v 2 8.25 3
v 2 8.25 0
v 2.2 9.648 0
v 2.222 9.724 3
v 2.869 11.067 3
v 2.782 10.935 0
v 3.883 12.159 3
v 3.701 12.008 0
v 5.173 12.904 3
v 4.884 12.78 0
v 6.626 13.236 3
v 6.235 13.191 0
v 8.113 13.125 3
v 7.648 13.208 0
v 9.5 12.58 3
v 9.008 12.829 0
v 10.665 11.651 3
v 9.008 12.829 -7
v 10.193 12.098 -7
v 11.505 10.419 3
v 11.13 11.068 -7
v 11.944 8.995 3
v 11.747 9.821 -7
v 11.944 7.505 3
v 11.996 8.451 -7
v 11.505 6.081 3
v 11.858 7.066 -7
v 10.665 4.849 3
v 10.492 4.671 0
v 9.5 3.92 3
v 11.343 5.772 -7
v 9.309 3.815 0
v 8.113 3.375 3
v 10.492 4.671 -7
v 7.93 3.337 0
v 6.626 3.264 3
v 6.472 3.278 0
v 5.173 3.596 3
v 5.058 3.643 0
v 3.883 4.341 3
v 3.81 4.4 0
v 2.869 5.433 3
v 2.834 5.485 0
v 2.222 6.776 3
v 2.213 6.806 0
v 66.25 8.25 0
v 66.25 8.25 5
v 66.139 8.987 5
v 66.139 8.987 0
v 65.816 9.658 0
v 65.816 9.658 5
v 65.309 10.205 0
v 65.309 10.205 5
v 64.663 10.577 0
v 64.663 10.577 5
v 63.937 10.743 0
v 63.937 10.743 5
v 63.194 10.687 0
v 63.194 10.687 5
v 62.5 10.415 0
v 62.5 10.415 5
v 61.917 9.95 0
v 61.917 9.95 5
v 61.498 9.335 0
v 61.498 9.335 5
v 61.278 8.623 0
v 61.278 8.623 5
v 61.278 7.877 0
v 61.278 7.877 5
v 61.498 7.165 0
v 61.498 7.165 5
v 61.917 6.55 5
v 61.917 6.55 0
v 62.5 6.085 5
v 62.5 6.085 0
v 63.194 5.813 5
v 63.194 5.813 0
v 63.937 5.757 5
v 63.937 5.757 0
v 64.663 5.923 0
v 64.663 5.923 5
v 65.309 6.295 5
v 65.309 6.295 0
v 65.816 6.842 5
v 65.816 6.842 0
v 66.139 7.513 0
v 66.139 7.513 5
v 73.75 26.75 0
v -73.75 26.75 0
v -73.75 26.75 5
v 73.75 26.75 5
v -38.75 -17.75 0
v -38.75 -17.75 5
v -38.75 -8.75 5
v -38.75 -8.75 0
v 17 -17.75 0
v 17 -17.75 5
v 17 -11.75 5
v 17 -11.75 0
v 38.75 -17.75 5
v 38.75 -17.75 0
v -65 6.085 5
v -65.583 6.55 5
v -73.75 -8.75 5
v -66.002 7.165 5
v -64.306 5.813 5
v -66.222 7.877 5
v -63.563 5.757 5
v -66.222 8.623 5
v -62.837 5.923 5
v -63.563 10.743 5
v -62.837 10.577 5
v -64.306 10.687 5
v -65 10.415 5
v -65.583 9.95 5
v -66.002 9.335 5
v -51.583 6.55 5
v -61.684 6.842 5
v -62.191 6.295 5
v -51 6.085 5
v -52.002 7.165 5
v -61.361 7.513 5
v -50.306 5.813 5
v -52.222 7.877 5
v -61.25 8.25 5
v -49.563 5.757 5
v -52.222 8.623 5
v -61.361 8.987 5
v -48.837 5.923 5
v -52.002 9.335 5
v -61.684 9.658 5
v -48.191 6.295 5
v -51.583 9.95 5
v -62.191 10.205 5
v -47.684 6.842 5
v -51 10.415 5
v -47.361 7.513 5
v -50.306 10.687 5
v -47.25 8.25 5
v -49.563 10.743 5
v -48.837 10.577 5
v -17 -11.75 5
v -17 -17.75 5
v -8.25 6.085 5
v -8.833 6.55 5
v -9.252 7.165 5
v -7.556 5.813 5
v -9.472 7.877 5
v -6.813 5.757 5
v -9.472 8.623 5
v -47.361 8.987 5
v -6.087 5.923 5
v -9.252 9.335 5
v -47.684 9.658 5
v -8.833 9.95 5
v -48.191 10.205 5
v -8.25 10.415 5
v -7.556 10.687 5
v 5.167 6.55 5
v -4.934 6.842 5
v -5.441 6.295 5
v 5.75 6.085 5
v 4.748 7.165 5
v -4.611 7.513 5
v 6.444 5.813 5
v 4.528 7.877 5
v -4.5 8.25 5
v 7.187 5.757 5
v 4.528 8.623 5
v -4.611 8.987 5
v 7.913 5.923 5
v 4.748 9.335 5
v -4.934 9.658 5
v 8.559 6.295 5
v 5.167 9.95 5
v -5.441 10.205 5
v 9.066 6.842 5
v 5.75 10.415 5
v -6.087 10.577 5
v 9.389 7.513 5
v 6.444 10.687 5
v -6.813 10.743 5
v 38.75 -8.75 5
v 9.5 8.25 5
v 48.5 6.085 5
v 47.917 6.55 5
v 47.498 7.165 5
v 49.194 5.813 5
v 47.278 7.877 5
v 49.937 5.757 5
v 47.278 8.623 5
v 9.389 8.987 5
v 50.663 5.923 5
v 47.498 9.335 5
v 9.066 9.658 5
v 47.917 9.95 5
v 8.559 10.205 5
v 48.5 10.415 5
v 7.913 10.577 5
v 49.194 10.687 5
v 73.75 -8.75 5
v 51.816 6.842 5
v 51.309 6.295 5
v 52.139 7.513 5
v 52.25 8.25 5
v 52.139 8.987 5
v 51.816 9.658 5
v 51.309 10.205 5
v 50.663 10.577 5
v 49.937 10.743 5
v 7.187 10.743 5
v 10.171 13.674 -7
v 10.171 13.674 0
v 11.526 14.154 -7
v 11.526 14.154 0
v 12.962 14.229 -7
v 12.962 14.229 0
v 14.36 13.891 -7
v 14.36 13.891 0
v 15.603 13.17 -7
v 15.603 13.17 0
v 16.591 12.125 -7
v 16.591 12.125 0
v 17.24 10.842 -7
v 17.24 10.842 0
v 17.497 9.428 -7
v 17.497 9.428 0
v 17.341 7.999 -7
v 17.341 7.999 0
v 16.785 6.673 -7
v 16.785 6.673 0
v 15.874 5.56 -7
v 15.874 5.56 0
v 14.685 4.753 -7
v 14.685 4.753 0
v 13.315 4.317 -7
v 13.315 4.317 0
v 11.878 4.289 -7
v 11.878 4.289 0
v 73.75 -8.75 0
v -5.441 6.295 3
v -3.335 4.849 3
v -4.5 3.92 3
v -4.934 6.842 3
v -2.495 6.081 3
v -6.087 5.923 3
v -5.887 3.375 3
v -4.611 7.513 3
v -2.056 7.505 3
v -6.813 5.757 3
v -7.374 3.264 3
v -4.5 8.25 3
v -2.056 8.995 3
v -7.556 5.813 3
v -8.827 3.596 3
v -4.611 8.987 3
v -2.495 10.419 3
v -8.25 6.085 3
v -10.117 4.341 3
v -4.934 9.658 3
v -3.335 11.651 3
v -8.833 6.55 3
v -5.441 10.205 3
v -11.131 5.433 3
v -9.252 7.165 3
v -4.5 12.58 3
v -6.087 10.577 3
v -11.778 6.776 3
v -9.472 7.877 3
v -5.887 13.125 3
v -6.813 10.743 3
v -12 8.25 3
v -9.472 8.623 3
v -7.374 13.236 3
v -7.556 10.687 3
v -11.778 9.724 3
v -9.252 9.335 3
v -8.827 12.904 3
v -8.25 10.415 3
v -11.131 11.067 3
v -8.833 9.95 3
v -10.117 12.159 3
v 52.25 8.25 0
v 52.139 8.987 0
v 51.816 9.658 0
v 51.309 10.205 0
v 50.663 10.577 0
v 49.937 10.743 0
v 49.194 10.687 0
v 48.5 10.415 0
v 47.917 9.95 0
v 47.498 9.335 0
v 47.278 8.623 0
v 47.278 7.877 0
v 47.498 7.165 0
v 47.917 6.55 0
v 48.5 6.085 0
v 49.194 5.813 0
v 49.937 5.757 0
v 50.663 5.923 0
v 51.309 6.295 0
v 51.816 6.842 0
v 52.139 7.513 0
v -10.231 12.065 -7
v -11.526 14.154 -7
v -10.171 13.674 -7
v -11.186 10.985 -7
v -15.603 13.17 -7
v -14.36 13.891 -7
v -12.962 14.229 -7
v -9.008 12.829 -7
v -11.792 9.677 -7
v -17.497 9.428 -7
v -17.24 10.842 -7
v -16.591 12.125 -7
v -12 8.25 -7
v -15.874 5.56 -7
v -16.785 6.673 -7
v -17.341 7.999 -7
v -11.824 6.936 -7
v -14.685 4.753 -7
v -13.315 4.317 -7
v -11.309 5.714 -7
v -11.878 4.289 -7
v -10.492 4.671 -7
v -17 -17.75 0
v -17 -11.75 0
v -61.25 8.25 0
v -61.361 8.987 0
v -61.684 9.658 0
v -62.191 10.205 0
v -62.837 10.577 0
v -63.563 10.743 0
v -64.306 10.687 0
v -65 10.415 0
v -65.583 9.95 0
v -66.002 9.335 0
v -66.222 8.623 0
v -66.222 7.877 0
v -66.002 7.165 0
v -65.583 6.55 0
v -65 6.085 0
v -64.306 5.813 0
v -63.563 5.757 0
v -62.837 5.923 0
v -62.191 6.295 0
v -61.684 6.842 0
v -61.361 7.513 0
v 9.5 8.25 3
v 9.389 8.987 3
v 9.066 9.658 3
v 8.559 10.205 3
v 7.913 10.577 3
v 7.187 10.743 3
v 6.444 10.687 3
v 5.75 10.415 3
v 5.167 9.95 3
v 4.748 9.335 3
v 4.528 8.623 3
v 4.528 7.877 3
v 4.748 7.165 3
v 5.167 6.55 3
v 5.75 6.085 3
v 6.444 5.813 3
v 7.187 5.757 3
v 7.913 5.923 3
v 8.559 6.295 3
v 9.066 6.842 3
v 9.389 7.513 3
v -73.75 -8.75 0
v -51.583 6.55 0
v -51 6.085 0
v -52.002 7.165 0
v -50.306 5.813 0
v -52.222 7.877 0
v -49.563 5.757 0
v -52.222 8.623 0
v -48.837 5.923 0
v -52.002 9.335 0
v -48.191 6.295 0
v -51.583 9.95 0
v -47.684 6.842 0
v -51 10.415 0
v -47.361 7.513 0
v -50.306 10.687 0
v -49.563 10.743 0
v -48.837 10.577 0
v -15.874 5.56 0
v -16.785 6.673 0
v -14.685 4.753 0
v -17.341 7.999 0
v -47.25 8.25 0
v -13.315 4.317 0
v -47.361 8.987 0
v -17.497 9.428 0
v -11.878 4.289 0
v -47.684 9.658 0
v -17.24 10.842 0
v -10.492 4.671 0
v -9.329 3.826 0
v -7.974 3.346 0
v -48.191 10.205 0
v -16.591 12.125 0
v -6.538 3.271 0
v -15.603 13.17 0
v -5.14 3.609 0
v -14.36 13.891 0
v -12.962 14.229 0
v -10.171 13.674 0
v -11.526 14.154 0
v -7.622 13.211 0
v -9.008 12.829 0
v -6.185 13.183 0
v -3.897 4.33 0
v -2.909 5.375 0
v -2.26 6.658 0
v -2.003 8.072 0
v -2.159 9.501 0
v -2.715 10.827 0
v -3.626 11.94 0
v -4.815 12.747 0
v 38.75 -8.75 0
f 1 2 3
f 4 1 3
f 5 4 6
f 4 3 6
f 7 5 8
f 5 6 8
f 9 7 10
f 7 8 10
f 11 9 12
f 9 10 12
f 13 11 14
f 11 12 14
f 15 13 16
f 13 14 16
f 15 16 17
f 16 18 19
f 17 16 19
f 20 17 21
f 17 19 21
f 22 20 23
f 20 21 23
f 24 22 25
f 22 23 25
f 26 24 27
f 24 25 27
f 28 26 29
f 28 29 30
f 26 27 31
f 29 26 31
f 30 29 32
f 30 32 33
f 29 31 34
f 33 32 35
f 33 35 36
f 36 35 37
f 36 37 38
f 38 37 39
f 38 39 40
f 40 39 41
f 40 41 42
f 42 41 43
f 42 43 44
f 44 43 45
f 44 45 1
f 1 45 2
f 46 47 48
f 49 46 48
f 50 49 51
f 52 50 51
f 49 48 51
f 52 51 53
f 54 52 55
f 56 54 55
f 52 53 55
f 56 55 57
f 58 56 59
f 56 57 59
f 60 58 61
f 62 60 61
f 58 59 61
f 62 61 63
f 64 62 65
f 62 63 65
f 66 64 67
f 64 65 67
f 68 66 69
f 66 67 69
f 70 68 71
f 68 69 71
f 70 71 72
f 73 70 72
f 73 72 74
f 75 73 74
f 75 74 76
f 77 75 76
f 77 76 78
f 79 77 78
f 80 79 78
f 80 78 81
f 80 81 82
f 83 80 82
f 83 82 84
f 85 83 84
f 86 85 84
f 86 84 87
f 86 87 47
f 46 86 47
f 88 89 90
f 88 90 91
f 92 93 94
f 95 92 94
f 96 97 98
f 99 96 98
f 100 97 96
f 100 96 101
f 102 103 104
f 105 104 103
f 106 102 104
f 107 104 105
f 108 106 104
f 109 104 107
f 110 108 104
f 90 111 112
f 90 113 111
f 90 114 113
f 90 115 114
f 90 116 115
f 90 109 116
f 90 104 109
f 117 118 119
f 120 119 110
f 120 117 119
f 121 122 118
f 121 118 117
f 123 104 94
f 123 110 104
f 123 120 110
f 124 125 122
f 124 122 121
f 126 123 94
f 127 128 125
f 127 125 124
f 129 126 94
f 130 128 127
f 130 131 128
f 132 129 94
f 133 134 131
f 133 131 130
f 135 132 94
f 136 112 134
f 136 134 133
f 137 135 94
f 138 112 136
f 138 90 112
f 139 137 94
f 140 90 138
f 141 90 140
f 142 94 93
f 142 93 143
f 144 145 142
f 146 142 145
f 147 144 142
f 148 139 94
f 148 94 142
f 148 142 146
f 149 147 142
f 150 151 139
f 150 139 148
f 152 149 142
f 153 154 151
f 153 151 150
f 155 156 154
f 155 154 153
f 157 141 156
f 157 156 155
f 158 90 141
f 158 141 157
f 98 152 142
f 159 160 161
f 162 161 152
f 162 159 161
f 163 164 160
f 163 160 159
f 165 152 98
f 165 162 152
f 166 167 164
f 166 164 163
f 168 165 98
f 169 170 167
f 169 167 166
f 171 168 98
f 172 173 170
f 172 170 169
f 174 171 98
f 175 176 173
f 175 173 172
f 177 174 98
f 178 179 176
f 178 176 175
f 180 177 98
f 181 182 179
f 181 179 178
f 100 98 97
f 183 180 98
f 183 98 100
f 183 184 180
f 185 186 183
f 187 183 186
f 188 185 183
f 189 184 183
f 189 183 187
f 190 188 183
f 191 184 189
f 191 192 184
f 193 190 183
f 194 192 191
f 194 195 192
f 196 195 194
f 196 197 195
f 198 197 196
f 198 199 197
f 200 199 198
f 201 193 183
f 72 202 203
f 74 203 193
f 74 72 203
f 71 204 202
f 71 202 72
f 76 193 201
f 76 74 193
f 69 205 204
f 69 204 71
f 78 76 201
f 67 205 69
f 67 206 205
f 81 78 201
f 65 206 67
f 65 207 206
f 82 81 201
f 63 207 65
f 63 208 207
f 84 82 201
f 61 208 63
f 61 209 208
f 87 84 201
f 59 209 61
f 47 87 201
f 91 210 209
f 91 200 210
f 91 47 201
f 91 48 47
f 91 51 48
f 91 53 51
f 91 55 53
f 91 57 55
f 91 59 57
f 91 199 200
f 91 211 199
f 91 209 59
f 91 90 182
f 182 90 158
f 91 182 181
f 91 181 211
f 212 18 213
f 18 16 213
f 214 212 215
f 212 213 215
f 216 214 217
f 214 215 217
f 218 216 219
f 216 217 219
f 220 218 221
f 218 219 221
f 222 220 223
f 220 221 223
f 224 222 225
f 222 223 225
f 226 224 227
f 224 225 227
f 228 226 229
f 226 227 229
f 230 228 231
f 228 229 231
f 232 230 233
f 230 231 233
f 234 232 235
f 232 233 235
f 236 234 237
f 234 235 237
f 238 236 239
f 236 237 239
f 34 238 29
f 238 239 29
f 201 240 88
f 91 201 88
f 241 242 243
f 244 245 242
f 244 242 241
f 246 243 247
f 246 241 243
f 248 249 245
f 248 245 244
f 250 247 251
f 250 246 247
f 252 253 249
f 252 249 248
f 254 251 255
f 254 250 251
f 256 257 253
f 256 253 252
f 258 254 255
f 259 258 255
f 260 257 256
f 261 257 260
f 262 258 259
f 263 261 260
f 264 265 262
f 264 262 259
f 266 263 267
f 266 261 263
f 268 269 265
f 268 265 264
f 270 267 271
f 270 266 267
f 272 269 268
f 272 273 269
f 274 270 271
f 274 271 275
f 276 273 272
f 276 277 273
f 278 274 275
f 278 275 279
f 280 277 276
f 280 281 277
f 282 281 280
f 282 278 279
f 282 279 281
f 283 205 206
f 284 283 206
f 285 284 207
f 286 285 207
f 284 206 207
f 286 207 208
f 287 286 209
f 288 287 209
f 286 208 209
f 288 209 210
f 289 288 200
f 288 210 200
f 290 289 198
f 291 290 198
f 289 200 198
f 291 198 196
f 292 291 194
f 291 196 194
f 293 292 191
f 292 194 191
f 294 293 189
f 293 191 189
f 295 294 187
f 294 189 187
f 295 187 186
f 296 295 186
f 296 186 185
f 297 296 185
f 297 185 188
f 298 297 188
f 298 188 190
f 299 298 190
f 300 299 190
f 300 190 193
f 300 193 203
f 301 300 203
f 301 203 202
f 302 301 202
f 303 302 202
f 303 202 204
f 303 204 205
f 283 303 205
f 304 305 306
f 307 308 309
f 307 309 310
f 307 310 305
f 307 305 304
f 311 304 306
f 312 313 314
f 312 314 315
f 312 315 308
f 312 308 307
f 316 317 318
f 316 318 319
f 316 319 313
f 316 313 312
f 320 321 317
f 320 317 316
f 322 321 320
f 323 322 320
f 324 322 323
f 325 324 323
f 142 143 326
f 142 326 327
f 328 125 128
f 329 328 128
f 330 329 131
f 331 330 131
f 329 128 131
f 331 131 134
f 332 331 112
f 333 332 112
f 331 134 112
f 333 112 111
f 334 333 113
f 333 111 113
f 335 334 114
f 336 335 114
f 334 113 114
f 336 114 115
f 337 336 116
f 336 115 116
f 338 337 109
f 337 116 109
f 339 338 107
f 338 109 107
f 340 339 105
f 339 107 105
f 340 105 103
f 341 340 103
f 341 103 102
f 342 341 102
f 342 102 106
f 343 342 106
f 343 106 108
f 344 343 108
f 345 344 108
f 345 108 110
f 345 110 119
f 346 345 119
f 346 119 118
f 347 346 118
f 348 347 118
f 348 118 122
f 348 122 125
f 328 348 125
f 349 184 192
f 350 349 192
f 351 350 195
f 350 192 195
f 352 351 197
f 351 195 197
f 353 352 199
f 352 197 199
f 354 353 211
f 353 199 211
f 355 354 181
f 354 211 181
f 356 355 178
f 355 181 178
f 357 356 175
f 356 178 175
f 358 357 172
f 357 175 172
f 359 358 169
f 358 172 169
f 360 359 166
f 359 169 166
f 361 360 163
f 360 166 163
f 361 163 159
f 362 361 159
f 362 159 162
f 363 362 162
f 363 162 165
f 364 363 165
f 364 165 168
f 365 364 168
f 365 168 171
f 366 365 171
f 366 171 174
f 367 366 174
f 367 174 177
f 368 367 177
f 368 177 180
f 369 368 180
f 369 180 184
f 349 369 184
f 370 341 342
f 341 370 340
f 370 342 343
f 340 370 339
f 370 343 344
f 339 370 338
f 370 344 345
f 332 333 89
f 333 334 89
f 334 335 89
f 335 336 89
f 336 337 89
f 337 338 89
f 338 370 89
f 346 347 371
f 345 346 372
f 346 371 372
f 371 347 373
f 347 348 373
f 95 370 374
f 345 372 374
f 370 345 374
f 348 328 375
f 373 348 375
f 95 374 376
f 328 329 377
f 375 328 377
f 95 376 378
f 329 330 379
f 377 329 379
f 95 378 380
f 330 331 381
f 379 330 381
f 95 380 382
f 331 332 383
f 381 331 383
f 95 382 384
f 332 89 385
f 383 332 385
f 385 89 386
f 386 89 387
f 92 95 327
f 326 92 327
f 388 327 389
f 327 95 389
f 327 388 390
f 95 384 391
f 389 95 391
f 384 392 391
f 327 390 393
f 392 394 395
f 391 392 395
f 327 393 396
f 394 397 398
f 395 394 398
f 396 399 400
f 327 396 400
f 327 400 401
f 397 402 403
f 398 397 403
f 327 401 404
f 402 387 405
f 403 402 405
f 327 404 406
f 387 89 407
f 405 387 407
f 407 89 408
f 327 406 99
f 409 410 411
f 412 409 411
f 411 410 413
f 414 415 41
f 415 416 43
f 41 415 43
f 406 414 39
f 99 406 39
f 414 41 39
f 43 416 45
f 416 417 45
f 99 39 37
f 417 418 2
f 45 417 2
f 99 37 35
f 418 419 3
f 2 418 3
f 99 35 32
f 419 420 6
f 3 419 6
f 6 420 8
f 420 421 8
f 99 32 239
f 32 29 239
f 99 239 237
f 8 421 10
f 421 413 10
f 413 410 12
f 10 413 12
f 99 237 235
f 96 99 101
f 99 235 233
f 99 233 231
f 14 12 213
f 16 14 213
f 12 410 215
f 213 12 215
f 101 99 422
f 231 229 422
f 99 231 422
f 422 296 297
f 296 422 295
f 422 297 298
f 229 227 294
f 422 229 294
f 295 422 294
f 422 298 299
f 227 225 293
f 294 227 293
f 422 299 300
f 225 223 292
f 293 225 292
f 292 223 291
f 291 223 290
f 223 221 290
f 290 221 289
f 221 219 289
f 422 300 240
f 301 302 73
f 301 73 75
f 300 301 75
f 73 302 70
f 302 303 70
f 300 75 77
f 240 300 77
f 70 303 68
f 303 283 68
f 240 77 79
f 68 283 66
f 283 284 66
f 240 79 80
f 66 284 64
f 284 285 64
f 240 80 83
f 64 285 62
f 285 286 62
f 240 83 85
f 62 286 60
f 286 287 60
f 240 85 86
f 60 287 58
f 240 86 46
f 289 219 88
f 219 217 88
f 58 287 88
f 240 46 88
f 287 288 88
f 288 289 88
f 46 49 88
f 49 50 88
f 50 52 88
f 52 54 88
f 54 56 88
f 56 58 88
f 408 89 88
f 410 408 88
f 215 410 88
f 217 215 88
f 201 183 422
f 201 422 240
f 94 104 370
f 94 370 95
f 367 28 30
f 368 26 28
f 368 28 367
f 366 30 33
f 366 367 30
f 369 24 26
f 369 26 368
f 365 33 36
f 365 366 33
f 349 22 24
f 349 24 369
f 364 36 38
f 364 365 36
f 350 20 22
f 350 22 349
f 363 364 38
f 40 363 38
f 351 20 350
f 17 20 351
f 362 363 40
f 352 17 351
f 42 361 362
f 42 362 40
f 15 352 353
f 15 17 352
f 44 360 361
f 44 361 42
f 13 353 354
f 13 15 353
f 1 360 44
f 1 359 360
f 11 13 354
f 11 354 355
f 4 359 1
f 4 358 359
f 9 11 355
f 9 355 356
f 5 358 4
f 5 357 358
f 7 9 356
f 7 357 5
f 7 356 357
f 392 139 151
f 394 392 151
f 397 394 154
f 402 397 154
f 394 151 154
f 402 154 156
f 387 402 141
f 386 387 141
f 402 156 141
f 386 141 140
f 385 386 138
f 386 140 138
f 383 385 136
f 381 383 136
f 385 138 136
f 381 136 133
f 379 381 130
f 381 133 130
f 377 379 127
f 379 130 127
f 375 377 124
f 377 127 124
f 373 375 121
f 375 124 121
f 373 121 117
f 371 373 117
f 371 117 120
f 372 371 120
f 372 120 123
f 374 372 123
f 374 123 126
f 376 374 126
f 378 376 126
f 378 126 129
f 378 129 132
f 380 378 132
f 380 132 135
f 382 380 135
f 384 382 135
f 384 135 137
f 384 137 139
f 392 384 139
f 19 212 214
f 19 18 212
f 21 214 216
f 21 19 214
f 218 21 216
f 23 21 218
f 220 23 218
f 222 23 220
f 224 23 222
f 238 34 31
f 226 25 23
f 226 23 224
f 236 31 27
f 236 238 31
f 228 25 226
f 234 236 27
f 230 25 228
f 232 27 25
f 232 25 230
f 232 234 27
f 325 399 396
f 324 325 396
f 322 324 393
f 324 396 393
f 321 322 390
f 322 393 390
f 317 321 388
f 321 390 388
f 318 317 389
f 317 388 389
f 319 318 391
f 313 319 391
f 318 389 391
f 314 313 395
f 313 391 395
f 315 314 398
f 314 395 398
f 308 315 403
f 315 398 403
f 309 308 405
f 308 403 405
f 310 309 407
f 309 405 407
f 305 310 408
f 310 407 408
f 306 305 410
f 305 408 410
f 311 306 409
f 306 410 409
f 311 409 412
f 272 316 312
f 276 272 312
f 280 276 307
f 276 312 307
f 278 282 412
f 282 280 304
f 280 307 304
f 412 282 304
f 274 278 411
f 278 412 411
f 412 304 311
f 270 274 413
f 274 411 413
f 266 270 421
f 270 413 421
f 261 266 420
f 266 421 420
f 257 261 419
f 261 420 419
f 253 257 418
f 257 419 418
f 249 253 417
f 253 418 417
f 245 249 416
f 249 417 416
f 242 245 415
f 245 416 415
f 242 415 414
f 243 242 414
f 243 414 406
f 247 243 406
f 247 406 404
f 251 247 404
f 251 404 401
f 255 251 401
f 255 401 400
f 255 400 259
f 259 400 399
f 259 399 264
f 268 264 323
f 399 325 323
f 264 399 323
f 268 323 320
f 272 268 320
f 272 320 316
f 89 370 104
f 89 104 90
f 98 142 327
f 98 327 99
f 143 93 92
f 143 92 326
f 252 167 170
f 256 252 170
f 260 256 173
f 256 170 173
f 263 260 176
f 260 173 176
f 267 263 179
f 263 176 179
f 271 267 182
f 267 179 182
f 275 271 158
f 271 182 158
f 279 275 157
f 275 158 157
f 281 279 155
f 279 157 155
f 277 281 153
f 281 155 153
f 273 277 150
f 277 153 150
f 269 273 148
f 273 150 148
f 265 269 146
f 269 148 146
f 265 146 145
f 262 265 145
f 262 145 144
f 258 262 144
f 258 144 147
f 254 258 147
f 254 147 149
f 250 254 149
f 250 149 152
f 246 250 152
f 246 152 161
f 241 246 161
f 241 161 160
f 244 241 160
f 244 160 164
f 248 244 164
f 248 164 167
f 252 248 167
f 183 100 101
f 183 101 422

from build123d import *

# Parameters (mm, degrees)
SKETCH1_W           = 147.5
SKETCH1_H           = 53.5
BOSS_EXTRUDE1_DEPTH = 5
SKETCH2_R           = 5
BOSS_EXTRUDE2_DEPTH = 7
SKETCH3_W           = 35
SKETCH3_H           = 18
CUT_EXTRUDE1_DEPTH  = 80.363877173
SKETCH4_W           = 34
SKETCH4_H           = 15
CUT_EXTRUDE2_DEPTH  = 10
SKETCH5_R           = 2.5
CUT_EXTRUDE3_DEPTH  = 80.363877173
SKETCH6_R           = 5
CUT_EXTRUDE4_DEPTH  = 10
SKETCH7_W           = 77.5
SKETCH7_H           = 9
CUT_EXTRUDE5_DEPTH  = 10


with BuildPart() as part:
    # Sketch1 → Boss-Extrude1 (new body)
    with BuildSketch(Plane.XY):
        Rectangle(SKETCH1_W, SKETCH1_H)
    extrude(amount=BOSS_EXTRUDE1_DEPTH)

    # Sketch2 → Boss-Extrude2 (add)
    with BuildSketch(Plane(origin=(0, 0, 0), x_dir=(-1, 0, 0), z_dir=(0, 0, -1))):
        with Locations(Location((12.5, 9.25, 0), (0, 0, 180))):
            Circle(SKETCH2_R)
        with Locations(Location((-12.5, 9.25, 0), (0, 0, 180))):
            Circle(SKETCH2_R)
    extrude(amount=BOSS_EXTRUDE2_DEPTH)

    # Sketch3 → Cut-Extrude1 (cut, through all)
    with BuildSketch(Plane.XY.offset(5)):
        with Locations((-56.25, -17.75)):
            Rectangle(SKETCH3_W, SKETCH3_H)
        with Locations((56.25, -17.75)):
            Rectangle(SKETCH3_W, SKETCH3_H)
    extrude(amount=-CUT_EXTRUDE1_DEPTH, mode=Mode.SUBTRACT)

    # Sketch4 → Cut-Extrude2 (cut)
    with BuildSketch(Plane.XY.offset(5)):
        with Locations((0, -19.25)):
            Rectangle(SKETCH4_W, SKETCH4_H)
    extrude(amount=-CUT_EXTRUDE2_DEPTH, mode=Mode.SUBTRACT)

    # Sketch5 → Cut-Extrude3 (cut, through all)
    with BuildSketch(Plane.XY.offset(5)):
        with Locations((63.75, 8.25)):
            Circle(SKETCH5_R)
        with Locations((49.75, 8.25)):
            Circle(SKETCH5_R)
        with Locations((7, 8.25)):
            Circle(SKETCH5_R)
        with Locations((-49.75, 8.25)):
            Circle(SKETCH5_R)
        with Locations((-63.75, 8.25)):
            Circle(SKETCH5_R)
        with Locations((-7, 8.25)):
            Circle(SKETCH5_R)
    extrude(amount=-CUT_EXTRUDE3_DEPTH, mode=Mode.SUBTRACT)

    # Sketch6 → Cut-Extrude4 (cut)
    with BuildSketch(Plane(origin=(0, 0, -7), x_dir=(-1, 0, 0), z_dir=(0, 0, -1))):
        with Locations((7, 8.25)):
            Circle(SKETCH6_R)
        with Locations((-7, 8.25)):
            Circle(SKETCH6_R)
    extrude(amount=-CUT_EXTRUDE4_DEPTH, mode=Mode.SUBTRACT)

    # Sketch7 → Cut-Extrude5 (cut)
    with BuildSketch(Plane.XY.offset(5)):
        with Locations((0, -22.25)):
            Rectangle(SKETCH7_W, SKETCH7_H)
    extrude(amount=-CUT_EXTRUDE5_DEPTH, mode=Mode.SUBTRACT)


solid = part.part
